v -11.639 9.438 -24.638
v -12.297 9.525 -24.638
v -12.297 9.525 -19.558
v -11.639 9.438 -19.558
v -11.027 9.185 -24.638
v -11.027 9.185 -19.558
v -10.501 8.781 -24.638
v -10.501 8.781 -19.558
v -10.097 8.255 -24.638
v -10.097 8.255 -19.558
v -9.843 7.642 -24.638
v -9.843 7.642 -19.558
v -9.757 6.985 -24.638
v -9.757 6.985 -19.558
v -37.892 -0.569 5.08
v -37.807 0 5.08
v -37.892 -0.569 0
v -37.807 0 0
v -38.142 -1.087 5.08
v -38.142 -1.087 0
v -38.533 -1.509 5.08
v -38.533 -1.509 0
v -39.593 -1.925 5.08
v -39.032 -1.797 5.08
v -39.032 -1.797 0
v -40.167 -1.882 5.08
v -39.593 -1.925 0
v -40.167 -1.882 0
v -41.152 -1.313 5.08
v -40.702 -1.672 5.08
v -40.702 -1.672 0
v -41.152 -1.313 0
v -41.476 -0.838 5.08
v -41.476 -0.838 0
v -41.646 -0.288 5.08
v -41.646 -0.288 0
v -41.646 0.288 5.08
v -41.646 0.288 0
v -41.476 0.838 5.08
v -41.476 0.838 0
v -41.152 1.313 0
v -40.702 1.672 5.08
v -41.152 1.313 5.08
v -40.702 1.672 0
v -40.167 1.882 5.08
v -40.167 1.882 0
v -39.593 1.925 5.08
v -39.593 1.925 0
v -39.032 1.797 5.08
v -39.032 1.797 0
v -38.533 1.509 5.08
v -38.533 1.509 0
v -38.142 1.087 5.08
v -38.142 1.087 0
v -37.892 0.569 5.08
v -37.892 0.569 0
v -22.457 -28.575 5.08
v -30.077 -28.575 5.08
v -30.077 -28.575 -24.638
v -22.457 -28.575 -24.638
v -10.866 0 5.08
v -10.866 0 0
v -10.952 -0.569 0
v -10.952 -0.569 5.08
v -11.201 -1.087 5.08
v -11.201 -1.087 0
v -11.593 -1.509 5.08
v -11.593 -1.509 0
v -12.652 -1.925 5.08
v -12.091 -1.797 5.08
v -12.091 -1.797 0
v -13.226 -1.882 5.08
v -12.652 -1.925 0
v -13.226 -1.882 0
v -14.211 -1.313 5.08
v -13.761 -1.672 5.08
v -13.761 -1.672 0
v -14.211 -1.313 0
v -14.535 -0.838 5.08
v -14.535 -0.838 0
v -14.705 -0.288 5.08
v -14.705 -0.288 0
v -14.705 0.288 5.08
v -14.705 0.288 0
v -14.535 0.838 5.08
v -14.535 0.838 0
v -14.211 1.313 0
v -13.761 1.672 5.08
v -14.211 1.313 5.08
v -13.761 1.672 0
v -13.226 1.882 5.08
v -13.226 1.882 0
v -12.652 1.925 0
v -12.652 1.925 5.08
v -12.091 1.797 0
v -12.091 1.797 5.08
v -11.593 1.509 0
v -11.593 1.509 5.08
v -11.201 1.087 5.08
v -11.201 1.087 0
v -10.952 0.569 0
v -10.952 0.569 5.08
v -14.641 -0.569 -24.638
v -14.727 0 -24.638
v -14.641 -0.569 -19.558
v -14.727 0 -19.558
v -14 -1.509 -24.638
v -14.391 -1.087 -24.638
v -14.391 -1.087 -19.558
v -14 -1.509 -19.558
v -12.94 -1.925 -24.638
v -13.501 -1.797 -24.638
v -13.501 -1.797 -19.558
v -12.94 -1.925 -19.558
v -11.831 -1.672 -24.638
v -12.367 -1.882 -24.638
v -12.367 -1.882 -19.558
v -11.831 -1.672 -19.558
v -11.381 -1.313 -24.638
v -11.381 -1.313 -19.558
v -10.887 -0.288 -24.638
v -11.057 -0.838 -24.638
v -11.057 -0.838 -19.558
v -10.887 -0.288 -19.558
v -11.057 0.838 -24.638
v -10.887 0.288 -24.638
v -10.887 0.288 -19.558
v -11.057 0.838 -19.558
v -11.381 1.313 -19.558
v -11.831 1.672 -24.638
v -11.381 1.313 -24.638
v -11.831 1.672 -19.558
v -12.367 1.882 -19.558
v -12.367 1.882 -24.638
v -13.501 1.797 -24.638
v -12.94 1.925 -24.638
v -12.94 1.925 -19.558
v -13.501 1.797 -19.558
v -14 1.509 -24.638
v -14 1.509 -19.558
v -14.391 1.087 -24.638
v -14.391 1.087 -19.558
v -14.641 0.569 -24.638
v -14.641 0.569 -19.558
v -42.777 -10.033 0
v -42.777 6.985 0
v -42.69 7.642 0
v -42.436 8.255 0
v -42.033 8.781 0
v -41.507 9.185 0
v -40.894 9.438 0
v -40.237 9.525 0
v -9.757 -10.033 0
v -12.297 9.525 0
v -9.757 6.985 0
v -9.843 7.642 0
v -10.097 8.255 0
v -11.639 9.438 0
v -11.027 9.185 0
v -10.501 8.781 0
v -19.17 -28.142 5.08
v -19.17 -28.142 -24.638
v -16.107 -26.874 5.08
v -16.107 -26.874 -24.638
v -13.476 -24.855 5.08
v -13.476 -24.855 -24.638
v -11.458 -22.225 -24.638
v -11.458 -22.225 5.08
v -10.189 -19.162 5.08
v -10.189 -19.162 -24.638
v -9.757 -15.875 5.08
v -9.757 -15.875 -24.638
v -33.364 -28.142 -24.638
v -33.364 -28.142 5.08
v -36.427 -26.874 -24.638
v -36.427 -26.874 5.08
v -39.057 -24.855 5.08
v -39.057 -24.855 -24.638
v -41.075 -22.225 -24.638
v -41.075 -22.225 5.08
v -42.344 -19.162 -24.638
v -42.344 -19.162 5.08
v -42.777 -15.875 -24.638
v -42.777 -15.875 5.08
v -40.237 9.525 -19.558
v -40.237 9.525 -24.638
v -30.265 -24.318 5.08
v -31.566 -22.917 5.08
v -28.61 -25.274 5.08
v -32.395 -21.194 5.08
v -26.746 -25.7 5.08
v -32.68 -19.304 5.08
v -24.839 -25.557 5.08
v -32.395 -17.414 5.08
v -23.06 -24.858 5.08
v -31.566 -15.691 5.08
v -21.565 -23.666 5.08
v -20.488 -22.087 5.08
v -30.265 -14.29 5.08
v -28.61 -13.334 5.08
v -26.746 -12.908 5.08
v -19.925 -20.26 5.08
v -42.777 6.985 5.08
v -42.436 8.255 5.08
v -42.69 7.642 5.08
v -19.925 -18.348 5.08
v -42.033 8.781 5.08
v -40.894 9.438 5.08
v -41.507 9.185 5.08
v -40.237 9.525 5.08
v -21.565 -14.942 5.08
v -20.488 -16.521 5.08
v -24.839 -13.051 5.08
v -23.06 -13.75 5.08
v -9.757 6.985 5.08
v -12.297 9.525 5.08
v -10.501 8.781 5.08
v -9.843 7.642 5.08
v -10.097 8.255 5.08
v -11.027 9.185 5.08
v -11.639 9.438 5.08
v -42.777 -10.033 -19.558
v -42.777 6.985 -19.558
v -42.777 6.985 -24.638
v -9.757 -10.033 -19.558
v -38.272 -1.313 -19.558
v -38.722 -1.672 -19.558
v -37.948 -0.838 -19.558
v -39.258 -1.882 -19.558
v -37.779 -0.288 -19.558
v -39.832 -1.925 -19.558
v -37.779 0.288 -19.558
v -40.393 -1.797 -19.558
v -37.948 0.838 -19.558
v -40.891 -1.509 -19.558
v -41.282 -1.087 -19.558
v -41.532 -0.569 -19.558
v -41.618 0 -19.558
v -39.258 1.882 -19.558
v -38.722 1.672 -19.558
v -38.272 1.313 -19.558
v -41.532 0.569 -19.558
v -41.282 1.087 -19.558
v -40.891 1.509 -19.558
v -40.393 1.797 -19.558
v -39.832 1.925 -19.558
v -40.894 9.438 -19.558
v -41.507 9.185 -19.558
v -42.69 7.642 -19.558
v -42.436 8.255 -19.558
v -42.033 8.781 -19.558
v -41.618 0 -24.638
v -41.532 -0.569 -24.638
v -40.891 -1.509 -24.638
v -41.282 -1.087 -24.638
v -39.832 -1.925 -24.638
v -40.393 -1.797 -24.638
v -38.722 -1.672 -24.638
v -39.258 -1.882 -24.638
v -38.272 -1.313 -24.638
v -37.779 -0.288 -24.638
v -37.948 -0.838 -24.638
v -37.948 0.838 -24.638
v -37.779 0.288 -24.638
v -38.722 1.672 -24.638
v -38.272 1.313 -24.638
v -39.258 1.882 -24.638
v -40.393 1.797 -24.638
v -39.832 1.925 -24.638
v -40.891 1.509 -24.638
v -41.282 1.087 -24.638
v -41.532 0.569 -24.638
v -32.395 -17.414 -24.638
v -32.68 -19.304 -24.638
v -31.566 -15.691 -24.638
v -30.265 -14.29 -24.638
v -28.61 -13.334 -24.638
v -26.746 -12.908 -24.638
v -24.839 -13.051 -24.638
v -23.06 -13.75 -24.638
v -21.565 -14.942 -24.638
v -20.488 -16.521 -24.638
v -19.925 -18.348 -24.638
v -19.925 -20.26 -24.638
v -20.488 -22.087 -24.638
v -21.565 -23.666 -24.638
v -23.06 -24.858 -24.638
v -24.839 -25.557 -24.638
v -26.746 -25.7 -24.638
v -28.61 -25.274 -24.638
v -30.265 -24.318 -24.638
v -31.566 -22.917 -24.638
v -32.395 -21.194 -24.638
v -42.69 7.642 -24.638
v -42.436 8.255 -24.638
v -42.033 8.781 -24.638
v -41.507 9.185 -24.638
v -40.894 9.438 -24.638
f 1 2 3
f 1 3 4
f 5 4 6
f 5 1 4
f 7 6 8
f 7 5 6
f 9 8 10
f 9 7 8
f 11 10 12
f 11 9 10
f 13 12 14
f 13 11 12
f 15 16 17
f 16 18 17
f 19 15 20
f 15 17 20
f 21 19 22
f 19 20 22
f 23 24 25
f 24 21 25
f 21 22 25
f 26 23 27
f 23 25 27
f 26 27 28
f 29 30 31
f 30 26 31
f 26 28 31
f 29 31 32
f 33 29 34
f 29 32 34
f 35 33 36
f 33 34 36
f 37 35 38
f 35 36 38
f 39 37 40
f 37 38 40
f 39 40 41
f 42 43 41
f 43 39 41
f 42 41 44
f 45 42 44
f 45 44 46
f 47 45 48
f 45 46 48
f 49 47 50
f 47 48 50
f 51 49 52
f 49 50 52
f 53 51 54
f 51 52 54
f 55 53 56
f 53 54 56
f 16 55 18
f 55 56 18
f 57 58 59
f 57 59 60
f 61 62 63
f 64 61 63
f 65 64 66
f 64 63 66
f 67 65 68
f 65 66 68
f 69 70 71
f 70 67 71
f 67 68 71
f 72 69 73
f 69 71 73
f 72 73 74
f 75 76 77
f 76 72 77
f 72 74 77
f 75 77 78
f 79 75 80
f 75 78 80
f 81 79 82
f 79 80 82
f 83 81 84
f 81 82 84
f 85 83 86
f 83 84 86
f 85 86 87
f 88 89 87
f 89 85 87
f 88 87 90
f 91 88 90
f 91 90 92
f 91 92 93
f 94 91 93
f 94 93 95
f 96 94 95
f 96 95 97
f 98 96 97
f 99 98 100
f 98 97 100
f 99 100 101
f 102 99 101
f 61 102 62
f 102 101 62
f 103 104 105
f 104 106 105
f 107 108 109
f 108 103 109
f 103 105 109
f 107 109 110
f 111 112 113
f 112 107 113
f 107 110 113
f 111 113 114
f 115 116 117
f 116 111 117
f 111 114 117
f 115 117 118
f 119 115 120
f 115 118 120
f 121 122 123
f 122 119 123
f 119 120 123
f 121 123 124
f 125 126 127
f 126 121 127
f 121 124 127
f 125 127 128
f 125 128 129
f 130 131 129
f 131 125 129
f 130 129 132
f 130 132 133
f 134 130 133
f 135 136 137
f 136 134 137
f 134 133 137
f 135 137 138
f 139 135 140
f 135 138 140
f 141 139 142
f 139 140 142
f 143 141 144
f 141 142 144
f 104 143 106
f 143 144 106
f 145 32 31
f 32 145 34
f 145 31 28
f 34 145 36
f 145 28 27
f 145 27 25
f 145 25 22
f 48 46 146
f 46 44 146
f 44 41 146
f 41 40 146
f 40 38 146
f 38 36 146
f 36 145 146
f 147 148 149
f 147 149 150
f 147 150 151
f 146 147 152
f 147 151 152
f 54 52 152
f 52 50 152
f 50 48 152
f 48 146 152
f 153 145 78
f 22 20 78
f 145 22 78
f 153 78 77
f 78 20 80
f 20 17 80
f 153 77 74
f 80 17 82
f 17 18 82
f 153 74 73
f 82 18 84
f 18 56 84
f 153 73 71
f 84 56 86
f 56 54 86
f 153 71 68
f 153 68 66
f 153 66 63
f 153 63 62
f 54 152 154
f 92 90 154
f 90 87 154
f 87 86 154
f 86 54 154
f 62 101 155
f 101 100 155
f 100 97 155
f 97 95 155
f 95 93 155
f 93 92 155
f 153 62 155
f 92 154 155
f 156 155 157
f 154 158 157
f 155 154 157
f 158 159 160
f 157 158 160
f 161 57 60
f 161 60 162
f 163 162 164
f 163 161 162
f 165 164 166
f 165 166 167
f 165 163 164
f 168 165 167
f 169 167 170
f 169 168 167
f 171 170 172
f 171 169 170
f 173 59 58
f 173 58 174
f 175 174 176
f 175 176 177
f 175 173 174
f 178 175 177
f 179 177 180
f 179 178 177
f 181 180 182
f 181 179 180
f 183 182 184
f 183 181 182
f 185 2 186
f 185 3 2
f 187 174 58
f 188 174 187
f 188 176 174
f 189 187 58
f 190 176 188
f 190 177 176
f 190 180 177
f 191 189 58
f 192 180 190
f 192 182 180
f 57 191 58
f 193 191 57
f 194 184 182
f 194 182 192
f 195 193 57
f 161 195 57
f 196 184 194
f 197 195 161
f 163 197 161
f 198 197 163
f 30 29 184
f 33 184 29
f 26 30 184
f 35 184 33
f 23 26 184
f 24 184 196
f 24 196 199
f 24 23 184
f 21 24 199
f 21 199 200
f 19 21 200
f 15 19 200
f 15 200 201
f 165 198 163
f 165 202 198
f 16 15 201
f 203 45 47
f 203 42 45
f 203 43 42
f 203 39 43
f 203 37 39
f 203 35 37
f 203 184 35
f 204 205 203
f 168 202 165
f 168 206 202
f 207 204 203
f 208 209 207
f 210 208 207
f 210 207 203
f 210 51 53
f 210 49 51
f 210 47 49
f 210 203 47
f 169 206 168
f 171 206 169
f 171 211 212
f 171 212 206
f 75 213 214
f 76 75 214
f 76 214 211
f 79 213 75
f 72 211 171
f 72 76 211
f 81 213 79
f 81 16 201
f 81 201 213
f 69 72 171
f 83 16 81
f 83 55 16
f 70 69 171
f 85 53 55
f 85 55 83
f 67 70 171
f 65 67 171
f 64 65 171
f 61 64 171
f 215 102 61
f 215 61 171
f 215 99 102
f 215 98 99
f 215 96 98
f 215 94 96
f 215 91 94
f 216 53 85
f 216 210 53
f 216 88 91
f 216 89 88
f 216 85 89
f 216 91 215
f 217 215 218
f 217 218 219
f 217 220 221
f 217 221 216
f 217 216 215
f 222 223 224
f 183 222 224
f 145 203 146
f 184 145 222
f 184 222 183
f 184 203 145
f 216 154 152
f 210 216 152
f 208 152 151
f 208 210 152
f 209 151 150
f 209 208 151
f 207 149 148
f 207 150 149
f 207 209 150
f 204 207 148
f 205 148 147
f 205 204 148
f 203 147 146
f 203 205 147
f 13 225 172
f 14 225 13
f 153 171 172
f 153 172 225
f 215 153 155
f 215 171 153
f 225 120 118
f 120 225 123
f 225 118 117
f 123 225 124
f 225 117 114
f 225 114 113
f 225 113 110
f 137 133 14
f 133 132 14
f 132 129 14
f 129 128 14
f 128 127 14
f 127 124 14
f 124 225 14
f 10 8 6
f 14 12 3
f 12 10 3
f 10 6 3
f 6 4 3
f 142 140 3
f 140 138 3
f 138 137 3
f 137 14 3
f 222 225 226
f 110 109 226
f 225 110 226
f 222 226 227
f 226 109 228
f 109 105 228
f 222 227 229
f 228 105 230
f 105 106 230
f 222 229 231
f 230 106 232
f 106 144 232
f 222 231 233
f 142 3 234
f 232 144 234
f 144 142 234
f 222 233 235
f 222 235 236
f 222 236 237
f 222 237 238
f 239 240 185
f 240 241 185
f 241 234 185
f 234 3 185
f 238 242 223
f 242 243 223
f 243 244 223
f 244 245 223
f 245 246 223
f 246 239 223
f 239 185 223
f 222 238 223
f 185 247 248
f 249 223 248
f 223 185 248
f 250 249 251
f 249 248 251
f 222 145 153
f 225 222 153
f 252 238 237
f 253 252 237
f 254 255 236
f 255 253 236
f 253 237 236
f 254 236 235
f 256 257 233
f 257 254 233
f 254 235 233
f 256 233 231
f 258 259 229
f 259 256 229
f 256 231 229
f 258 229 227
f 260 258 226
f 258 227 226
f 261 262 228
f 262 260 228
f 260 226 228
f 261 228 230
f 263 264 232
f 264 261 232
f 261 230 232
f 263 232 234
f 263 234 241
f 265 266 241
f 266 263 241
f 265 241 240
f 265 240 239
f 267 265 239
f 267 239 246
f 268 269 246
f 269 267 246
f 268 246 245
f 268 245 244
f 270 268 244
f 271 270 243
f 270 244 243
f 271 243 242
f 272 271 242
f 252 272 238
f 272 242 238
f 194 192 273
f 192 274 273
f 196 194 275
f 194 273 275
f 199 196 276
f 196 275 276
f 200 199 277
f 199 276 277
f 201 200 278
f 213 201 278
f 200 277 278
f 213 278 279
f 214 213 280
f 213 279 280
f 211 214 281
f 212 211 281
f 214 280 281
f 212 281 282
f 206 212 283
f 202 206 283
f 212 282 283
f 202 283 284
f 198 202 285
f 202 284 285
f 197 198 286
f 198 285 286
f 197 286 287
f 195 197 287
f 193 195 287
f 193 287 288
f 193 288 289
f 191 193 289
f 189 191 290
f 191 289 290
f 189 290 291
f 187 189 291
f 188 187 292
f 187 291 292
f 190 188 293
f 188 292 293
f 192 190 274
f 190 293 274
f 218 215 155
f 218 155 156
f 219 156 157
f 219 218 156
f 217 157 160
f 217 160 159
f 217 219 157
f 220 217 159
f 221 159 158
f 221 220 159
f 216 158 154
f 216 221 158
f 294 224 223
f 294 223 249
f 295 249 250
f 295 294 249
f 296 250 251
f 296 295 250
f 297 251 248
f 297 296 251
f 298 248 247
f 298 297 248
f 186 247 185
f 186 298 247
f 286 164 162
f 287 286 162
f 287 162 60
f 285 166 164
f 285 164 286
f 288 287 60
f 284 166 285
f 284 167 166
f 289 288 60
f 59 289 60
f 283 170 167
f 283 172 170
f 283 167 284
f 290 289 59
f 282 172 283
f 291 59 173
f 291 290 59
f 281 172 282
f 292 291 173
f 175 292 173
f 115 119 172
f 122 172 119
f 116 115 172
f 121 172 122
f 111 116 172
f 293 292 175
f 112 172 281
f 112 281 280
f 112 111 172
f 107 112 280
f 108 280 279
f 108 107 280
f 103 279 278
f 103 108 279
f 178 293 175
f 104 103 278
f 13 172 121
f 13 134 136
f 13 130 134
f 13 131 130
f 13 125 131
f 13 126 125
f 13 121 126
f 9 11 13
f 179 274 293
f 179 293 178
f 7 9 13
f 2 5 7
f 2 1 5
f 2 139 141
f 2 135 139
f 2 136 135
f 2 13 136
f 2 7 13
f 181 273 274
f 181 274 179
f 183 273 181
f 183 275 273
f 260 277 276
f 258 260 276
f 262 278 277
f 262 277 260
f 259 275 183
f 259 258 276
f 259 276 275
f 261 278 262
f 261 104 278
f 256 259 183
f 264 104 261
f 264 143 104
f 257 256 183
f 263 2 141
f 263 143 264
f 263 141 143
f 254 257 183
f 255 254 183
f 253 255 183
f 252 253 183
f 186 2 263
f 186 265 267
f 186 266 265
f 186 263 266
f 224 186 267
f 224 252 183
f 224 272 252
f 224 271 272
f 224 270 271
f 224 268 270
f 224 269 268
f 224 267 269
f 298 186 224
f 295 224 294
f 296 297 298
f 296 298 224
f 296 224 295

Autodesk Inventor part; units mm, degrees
ref_plane "YZ Plane" through (0, 0, 0) normal (1, 0, 0) x (0, 1, 0)
ref_plane "XZ Plane" through (0, 0, 0) normal (0, 1, 0) x (-1, 0, 0)
ref_plane "XY Plane" through (0, 0, 0) normal (0, 0, 1) x (1, 0, 0)
ref_plane "Work Plane1" through (0, 0, 0) normal (0, 0, 1) x (1, 0, 0)
sketch "Sketch1" plane through (0, 0, 0) normal (0, 0, 1) x (1, 0, 0)
  line L0 (-9.7566, -4.627) -> (-9.7566, 4.627) construction
  line L1 (-9.7566, -9.525) -> (-314.5566, -9.525) construction
  line L2 (-9.7566, 9.525) -> (-314.5566, 9.525) construction
  line L3 (-42.7766, 3) -> (-42.7766, -3) construction
  line L4 (-9.7566, 9.525) -> (-42.7766, 9.525)
  line L5 (-42.7766, 9.525) -> (-42.7766, -9.525)
  line L6 (-9.7566, -9.525) -> (-9.7566, 9.525)
  line L7 (-9.7566, -9.525) -> (-9.7566, -28.575)
  line L8 (-9.7566, -28.575) -> (-42.7766, -28.575)
  line L9 (-42.7766, -28.575) -> (-42.7766, -9.525)
  arc A0 (-38.0982, 0.6213) -> (-38.1469, -0.737) centre (-39.737, 0) ccw construction
  arc A1 (-11.1575, 0.6213) -> (-11.2061, -0.737) centre (-12.7962, 0) ccw construction
  circle A2 centre (-12.7962, 0) radius 1.9304
  circle A3 centre (-39.737, 0) radius 1.9304
  point P0 (0, 0)
  dimension "d1" = 19.05
  dimension "d2" = 3.8608
  dimension "d3" = 3.8608
extrude "Extrusion1" add sketch "Sketch1" along normal blind 5.08
ref_plane "Work Plane2" through (0, 0, -19.558) normal (0, 0, -1) x (-1, 0, 0)
sketch "Sketch2" plane through (0, 0, -19.558) normal (0, 0, -1) x (-1, 0, 0)
  line L0 (9.7566, -28.575) -> (9.7566, 9.525) projected
  line L1 (42.7766, 9.525) -> (42.7766, -28.575) projected
  line L2 (9.7566, 9.525) -> (42.7766, 9.525)
  line L3 (42.7766, 9.525) -> (42.7766, -28.575)
  line L4 (42.7766, -28.575) -> (9.7566, -28.575)
  line L5 (9.7566, -28.575) -> (9.7566, 9.525)
  circle A0 centre (12.7962, 0) radius 1.9304 projected
  circle A1 centre (12.7962, 0) radius 1.9304
  circle A2 centre (39.6875, 0) radius 1.9304
  point P0 (0, 0)
  dimension "d7" = 3.8608
  dimension "d8" = 3.8608
  dimension "d24" = 38.1
  dimension "d25" = 9.525
  dimension "d26" = 26.8913
extrude "Extrusion2" add sketch "Sketch2" along normal blind 5.08
sketch "Sketch3" plane through (0, 0, 0) normal (0, 0, -1) x (-1, 0, 0)
  line L0 (9.7566, 9.525) -> (42.7766, 9.525) construction
  line L1 (9.7566, 9.525) -> (42.7766, 9.525) construction
  line L2 (42.7766, 9.525) -> (42.7766, -9.525) construction
  line L3 (42.7766, -9.525) -> (9.7566, -9.525) construction
  line L4 (9.7566, -9.525) -> (9.7566, 9.525) construction
  line L5 (42.7766, -28.575) -> (9.7566, -28.575) projected
  line L6 (42.7766, -10.033) -> (42.7766, -28.575)
  line L7 (42.7766, -28.575) -> (9.7566, -28.575)
  line L8 (9.7566, -28.575) -> (9.7566, -10.033)
  line L9 (42.7766, 9.525) -> (42.7766, -28.575) projected
  line L10 (42.7766, -10.033) -> (9.7566, -10.033)
  point P0 (0, 0)
  dimension "d11" = 19.05
extrude "Extrusion3" add sketch "Sketch3" along normal up to surface (19.558 mm away)
sketch "Sketch4" plane through (0, 0, -24.638) normal (0, 0, -1) x (-1, 0, 0)
  circle A0 centre (26.2666, -19.304) radius 6.4135
  line L0 (9.7566, -28.575) -> (42.7766, -28.575) projected
  line L1 (42.7766, -28.575) -> (42.7766, 9.525) projected
  line L2 (9.7566, 9.525) -> (9.7566, -28.575) projected
  line L3 (42.7766, -10.033) -> (9.7566, -10.033) construction
  point P0 (0, 0)
  dimension "d15" = 12.827
  dimension "d16" = 9.271
  dimension "d17" = 33.02
  dimension "d18" = 16.51
  dimension "d19" = 18.542
extrude "Extrusion4" cut sketch "Sketch4" against normal through all
fillet "Fillet1" radius 12.7 2 edges at (-9.7566, -28.575, -9.779) (-42.7766, -28.575, -9.779)
fillet "Fillet2" radius 2.54 4 edges at (-9.7566, 9.525, -22.098) (-9.7566, 9.525, 2.54) (-42.7766, 9.525, -22.098) (-42.7766, 9.525, 2.54)
equation "\"d16\" = 0.5 * d19"
equation "\"d18\" = 0.5 * d17"
properties part number "Bearing mount for xrail"
